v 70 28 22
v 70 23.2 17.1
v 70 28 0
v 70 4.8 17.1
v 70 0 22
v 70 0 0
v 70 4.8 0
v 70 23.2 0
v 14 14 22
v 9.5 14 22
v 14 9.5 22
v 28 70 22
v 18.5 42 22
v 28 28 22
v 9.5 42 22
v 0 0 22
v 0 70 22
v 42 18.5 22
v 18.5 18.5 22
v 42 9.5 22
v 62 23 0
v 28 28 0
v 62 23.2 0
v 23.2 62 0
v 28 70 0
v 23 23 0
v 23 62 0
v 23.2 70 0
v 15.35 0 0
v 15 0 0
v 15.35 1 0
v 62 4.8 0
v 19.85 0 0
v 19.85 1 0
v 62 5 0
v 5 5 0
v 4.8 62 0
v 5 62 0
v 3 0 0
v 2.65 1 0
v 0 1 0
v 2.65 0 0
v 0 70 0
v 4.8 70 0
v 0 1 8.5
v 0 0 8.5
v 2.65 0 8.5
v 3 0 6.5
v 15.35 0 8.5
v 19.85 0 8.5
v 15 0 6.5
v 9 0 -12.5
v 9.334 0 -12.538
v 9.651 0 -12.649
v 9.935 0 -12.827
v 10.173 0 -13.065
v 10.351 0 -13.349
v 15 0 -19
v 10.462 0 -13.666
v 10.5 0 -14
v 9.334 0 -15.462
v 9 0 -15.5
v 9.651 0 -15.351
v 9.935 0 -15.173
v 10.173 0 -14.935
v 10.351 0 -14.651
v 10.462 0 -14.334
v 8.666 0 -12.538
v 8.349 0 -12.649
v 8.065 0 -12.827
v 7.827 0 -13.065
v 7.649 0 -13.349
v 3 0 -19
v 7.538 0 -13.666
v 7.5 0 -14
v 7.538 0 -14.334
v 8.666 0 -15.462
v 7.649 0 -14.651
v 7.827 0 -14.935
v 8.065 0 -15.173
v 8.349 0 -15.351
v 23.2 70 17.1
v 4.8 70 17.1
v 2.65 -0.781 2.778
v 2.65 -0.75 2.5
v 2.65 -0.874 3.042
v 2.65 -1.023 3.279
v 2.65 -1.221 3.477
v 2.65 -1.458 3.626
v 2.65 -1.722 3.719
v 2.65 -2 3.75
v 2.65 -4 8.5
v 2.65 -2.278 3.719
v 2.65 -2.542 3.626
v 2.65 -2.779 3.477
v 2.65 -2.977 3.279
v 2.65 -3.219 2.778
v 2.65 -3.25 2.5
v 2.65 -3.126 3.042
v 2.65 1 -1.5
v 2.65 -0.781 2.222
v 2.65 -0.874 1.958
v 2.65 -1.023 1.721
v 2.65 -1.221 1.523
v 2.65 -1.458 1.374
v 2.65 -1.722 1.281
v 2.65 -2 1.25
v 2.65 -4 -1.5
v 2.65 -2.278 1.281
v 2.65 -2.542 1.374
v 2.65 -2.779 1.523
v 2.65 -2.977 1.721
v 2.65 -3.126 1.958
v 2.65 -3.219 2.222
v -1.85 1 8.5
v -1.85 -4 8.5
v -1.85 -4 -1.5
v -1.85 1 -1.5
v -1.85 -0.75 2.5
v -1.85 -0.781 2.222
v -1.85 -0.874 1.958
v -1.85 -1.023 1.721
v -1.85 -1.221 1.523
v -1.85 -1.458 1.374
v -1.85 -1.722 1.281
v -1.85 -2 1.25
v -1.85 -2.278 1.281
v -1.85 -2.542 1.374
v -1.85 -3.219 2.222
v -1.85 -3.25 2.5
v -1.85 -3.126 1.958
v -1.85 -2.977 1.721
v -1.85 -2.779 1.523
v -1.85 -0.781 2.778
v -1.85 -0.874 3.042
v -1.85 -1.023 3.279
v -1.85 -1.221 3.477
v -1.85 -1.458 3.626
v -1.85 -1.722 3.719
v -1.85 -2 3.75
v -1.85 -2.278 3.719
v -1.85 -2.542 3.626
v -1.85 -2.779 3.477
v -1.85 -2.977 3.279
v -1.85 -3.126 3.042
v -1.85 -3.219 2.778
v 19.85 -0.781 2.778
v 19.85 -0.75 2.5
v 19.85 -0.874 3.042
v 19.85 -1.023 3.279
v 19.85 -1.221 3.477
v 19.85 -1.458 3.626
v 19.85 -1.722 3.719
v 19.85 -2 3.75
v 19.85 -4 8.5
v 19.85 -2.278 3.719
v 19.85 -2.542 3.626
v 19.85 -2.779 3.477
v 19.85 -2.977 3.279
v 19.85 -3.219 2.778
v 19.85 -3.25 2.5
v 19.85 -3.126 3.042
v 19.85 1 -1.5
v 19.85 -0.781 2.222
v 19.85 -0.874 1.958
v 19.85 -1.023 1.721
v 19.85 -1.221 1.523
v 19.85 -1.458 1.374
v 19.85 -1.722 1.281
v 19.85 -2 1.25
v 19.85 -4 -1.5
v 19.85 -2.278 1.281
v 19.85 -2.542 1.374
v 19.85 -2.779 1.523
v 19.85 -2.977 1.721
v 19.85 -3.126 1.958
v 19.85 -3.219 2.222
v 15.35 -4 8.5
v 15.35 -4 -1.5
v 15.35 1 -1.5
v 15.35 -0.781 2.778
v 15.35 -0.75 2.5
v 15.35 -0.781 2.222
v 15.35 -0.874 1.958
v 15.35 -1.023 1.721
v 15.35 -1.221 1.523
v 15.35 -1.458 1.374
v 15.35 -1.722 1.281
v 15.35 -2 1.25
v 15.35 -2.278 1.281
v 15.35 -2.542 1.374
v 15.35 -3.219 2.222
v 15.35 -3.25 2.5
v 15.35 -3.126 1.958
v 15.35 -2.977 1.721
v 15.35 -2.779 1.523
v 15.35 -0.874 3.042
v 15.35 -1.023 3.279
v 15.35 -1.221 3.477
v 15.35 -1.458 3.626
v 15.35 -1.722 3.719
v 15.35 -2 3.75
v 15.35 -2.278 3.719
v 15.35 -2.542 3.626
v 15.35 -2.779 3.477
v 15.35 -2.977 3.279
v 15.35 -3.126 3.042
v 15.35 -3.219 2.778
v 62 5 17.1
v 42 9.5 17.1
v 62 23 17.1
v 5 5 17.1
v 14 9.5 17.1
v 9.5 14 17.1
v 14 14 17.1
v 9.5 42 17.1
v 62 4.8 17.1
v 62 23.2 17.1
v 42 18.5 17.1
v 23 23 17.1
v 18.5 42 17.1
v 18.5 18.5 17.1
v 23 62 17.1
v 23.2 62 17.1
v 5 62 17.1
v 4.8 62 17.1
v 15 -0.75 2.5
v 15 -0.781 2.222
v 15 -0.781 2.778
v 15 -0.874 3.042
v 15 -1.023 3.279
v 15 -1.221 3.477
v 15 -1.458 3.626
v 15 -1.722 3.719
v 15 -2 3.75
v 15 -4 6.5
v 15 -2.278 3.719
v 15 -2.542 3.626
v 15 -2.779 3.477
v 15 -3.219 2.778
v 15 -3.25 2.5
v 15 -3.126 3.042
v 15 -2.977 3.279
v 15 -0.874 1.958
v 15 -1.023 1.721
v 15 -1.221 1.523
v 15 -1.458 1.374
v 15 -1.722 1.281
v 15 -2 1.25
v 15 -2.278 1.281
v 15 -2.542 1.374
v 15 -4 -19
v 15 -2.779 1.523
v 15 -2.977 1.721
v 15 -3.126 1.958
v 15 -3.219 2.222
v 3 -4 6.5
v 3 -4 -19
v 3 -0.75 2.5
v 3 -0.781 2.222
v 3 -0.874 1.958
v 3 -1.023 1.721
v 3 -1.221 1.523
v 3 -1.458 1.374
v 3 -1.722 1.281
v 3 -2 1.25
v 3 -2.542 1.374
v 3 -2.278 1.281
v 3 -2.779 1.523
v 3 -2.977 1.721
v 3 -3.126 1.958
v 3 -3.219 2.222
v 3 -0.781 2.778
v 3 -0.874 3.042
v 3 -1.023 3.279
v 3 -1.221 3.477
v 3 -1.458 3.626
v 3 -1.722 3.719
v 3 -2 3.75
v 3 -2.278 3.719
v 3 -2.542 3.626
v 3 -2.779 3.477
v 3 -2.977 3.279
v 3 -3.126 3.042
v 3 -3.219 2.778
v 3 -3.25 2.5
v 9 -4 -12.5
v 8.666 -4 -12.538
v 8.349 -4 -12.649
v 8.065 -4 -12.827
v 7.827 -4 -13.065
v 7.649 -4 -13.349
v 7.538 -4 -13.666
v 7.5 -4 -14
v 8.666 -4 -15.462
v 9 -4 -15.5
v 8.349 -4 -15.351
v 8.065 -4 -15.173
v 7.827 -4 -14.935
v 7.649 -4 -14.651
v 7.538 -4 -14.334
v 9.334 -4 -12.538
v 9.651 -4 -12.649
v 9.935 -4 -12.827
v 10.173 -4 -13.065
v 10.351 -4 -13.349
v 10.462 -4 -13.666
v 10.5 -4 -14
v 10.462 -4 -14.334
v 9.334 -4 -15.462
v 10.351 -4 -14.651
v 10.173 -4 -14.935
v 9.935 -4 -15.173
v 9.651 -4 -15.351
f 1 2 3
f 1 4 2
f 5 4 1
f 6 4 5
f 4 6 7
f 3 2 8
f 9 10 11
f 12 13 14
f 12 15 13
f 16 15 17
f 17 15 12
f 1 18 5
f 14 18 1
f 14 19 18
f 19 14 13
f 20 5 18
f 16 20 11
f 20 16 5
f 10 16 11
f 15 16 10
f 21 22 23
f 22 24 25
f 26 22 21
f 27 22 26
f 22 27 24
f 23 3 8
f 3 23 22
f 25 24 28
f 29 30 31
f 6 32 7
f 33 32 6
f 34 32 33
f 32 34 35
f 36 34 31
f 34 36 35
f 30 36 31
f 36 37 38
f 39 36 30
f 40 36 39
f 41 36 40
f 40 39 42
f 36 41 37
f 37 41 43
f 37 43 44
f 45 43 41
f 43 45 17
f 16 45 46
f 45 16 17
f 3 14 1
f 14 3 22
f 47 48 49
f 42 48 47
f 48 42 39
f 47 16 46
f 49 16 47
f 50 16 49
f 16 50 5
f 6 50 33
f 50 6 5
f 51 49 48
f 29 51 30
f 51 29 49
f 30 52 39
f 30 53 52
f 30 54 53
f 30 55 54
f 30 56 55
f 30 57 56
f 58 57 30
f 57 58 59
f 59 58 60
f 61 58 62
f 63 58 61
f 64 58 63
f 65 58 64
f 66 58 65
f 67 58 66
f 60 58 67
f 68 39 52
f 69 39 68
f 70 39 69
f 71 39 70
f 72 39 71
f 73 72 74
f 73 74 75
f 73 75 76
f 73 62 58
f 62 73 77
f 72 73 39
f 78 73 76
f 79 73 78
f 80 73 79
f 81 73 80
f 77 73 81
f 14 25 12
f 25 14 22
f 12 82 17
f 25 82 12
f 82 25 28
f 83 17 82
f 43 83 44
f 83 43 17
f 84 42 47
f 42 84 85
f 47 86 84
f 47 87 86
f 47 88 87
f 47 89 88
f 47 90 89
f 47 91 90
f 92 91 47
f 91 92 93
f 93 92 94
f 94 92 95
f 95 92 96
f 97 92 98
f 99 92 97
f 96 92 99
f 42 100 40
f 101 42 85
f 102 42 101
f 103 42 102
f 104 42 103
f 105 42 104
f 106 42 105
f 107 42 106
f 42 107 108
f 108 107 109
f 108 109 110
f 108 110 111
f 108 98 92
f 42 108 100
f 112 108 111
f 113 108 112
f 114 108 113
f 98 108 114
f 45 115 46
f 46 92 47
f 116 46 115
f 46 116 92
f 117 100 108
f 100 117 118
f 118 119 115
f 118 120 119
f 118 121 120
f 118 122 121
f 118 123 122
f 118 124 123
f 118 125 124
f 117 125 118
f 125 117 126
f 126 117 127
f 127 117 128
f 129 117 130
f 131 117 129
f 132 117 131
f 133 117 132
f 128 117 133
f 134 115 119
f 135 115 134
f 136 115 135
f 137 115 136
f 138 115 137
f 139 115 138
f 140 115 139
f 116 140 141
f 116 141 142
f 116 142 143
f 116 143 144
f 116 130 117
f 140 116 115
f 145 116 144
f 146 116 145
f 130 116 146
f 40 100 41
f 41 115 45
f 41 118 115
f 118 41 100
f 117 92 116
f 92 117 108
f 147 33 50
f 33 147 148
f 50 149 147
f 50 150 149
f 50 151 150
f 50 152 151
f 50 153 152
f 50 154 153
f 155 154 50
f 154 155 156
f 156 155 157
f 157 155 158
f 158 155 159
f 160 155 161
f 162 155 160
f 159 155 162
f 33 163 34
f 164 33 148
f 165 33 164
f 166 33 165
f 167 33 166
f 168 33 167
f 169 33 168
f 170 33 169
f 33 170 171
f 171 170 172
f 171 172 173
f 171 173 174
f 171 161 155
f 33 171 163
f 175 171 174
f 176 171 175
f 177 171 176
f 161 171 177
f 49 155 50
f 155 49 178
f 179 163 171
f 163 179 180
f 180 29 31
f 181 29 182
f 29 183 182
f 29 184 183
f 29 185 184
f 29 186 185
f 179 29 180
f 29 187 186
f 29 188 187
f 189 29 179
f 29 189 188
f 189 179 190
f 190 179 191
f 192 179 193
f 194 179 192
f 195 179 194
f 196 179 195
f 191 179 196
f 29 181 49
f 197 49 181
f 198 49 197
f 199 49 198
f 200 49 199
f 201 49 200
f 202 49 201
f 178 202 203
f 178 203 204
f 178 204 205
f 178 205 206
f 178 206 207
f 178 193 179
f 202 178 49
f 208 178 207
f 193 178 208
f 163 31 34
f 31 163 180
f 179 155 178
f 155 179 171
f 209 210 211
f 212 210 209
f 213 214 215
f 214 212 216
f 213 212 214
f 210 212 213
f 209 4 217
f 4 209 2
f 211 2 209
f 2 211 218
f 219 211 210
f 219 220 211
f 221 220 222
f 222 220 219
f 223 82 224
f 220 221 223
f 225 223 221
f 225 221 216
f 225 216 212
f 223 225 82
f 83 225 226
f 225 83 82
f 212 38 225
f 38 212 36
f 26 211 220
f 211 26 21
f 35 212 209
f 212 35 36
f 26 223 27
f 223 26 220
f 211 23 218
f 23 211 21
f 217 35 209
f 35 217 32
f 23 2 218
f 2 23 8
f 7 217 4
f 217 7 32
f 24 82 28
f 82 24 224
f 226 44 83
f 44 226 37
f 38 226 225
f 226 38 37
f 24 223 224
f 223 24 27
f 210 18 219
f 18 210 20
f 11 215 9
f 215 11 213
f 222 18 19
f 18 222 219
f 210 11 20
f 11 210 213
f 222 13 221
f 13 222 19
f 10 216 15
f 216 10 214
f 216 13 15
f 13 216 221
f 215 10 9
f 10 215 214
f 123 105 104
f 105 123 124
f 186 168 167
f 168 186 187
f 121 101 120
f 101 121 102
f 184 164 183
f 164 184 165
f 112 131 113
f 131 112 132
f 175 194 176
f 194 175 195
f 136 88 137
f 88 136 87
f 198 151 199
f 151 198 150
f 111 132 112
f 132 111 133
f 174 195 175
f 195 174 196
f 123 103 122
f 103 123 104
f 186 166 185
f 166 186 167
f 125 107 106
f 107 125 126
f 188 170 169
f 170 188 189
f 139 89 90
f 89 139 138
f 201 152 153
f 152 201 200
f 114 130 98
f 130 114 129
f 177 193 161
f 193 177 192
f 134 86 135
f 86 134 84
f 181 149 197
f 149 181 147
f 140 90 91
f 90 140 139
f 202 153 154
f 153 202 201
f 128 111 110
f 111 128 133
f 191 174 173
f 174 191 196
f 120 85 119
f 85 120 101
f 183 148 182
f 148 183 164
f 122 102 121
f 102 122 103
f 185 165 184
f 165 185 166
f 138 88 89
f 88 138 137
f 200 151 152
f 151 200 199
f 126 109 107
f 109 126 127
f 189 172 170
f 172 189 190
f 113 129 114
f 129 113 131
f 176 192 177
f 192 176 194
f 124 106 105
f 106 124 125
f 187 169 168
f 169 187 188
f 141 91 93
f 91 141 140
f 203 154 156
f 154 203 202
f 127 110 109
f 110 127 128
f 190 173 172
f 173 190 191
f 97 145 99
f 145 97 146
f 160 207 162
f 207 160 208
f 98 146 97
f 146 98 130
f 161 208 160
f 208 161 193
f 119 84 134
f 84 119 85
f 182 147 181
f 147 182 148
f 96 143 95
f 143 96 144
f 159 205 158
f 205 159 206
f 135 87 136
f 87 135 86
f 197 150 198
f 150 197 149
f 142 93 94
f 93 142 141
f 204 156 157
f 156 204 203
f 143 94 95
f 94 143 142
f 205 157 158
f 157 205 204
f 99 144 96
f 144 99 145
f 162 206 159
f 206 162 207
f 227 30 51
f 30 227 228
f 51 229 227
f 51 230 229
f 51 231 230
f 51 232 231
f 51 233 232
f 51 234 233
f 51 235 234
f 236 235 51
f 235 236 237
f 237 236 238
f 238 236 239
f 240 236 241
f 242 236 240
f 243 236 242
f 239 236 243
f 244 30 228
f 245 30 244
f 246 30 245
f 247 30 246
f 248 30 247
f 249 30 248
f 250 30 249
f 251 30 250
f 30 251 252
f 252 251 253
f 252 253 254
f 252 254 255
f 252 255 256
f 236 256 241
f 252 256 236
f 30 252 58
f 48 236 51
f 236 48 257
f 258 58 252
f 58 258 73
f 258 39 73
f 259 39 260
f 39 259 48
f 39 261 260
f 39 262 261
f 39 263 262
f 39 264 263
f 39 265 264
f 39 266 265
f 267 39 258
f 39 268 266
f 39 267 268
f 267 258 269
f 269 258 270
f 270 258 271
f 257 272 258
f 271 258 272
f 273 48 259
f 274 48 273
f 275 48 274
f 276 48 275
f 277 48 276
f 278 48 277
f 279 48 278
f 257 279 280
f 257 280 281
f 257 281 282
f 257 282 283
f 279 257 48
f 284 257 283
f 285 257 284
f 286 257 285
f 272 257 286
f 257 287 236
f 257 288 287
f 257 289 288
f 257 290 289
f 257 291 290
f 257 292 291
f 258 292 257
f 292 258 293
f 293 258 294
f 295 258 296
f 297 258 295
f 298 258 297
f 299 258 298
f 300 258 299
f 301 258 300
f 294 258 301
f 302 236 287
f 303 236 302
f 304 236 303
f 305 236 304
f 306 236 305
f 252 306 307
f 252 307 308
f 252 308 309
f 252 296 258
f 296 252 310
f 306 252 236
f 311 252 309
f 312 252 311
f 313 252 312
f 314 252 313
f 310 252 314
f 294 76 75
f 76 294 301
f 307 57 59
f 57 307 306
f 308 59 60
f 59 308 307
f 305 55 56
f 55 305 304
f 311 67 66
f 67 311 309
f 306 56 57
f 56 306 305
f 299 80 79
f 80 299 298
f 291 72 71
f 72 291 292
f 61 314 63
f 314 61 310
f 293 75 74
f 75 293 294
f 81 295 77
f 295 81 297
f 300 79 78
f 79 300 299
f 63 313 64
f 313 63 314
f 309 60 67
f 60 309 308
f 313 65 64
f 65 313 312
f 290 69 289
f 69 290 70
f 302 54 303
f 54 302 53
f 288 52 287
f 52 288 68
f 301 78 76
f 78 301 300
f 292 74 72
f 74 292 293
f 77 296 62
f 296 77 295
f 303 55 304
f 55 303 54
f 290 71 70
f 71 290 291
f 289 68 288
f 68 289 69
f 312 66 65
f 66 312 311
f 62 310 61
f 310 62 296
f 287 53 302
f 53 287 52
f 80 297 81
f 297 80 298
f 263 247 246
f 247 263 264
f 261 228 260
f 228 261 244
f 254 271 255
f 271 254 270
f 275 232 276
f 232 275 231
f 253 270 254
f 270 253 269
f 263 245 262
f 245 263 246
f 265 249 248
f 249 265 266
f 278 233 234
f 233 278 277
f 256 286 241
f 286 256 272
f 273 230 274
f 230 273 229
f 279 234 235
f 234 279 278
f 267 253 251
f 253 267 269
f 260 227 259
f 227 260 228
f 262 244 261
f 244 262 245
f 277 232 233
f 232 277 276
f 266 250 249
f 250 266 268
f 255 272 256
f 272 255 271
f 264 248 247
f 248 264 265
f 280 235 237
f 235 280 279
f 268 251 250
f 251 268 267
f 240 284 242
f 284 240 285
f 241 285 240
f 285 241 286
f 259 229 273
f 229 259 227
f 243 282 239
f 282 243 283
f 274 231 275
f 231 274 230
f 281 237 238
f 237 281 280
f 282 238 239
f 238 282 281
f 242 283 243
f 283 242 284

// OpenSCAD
// Gövde 70×22, et 5, kanal 18. Kulak iki yanak arasında. Vida Ø2.5.
// Kılavuz: kenardan 9, üstten 36, Ø3.

clamp = 18;
entry = 18.4;
wall = 5;
arm = 70;
h = 22;
top = 5;
drop = h - top;
mouth = 8;
hole_x = 9;
hole_from_top = 36;
hole_z = h - hole_from_top;
screw_r = 1.25;
guide_r = 1.5;
ear_w = 12;
ear_t = 4;
cheek_w = 4.5;
cheek_t = 4;
clear = 0.35;
ch = wall + clamp + wall;
screw_z = 2.5;
cheek_y0 = -cheek_t;
cheek_dy = cheek_t + 1;
ear_y = cheek_y0;
screw_y = cheek_y0 + cheek_t / 2;
left_x = hole_x - ear_w / 2 - clear - cheek_w;
right_x = hole_x + ear_w / 2 + clear;
ear_bot = hole_z - 5;
ear_top = screw_z + 4;

module body() {
  difference() {
    union() {
      cube([arm, ch, h]);
      cube([ch, arm, h]);
      translate([left_x, cheek_y0, screw_z - 4]) cube([cheek_w, cheek_dy, 10]);
      translate([right_x, cheek_y0, screw_z - 4]) cube([cheek_w, cheek_dy, 10]);
    }
    translate([wall, wall, -0.1]) cube([arm - wall + 1, clamp, drop + 0.2]);
    translate([wall, wall, -0.1]) cube([clamp, arm - wall + 1, drop + 0.2]);
    flare = (entry - clamp) / 2;
    translate([arm - mouth, wall - flare, -0.1]) cube([mouth + 1, entry, drop + 0.2]);
    translate([wall - flare, arm - mouth, -0.1]) cube([entry, mouth + 1, drop + 0.2]);
    win = 9;
    translate([14, wall + (clamp - win) / 2, drop - 1]) cube([28, win, top + 2]);
    translate([wall + (clamp - win) / 2, 14, drop - 1]) cube([win, 28, top + 2]);
    translate([(left_x + right_x + cheek_w) / 2, screw_y, screw_z])
      rotate([0, 90, 0]) cylinder(h = (right_x + cheek_w) - left_x + 2, r = screw_r, center = true, $fn = 28);
  }
}

module ear() {
  difference() {
    translate([hole_x - ear_w / 2, ear_y, ear_bot])
      cube([ear_w, ear_t, ear_top - ear_bot]);
    translate([hole_x, screw_y, hole_z])
      rotate([90, 0, 0]) cylinder(h = ear_t + 4, r = guide_r, center = true, $fn = 28);
    translate([hole_x, screw_y, screw_z])
      rotate([0, 90, 0]) cylinder(h = ear_w + 2, r = screw_r, center = true, $fn = 28);
  }
}

body();
ear();
